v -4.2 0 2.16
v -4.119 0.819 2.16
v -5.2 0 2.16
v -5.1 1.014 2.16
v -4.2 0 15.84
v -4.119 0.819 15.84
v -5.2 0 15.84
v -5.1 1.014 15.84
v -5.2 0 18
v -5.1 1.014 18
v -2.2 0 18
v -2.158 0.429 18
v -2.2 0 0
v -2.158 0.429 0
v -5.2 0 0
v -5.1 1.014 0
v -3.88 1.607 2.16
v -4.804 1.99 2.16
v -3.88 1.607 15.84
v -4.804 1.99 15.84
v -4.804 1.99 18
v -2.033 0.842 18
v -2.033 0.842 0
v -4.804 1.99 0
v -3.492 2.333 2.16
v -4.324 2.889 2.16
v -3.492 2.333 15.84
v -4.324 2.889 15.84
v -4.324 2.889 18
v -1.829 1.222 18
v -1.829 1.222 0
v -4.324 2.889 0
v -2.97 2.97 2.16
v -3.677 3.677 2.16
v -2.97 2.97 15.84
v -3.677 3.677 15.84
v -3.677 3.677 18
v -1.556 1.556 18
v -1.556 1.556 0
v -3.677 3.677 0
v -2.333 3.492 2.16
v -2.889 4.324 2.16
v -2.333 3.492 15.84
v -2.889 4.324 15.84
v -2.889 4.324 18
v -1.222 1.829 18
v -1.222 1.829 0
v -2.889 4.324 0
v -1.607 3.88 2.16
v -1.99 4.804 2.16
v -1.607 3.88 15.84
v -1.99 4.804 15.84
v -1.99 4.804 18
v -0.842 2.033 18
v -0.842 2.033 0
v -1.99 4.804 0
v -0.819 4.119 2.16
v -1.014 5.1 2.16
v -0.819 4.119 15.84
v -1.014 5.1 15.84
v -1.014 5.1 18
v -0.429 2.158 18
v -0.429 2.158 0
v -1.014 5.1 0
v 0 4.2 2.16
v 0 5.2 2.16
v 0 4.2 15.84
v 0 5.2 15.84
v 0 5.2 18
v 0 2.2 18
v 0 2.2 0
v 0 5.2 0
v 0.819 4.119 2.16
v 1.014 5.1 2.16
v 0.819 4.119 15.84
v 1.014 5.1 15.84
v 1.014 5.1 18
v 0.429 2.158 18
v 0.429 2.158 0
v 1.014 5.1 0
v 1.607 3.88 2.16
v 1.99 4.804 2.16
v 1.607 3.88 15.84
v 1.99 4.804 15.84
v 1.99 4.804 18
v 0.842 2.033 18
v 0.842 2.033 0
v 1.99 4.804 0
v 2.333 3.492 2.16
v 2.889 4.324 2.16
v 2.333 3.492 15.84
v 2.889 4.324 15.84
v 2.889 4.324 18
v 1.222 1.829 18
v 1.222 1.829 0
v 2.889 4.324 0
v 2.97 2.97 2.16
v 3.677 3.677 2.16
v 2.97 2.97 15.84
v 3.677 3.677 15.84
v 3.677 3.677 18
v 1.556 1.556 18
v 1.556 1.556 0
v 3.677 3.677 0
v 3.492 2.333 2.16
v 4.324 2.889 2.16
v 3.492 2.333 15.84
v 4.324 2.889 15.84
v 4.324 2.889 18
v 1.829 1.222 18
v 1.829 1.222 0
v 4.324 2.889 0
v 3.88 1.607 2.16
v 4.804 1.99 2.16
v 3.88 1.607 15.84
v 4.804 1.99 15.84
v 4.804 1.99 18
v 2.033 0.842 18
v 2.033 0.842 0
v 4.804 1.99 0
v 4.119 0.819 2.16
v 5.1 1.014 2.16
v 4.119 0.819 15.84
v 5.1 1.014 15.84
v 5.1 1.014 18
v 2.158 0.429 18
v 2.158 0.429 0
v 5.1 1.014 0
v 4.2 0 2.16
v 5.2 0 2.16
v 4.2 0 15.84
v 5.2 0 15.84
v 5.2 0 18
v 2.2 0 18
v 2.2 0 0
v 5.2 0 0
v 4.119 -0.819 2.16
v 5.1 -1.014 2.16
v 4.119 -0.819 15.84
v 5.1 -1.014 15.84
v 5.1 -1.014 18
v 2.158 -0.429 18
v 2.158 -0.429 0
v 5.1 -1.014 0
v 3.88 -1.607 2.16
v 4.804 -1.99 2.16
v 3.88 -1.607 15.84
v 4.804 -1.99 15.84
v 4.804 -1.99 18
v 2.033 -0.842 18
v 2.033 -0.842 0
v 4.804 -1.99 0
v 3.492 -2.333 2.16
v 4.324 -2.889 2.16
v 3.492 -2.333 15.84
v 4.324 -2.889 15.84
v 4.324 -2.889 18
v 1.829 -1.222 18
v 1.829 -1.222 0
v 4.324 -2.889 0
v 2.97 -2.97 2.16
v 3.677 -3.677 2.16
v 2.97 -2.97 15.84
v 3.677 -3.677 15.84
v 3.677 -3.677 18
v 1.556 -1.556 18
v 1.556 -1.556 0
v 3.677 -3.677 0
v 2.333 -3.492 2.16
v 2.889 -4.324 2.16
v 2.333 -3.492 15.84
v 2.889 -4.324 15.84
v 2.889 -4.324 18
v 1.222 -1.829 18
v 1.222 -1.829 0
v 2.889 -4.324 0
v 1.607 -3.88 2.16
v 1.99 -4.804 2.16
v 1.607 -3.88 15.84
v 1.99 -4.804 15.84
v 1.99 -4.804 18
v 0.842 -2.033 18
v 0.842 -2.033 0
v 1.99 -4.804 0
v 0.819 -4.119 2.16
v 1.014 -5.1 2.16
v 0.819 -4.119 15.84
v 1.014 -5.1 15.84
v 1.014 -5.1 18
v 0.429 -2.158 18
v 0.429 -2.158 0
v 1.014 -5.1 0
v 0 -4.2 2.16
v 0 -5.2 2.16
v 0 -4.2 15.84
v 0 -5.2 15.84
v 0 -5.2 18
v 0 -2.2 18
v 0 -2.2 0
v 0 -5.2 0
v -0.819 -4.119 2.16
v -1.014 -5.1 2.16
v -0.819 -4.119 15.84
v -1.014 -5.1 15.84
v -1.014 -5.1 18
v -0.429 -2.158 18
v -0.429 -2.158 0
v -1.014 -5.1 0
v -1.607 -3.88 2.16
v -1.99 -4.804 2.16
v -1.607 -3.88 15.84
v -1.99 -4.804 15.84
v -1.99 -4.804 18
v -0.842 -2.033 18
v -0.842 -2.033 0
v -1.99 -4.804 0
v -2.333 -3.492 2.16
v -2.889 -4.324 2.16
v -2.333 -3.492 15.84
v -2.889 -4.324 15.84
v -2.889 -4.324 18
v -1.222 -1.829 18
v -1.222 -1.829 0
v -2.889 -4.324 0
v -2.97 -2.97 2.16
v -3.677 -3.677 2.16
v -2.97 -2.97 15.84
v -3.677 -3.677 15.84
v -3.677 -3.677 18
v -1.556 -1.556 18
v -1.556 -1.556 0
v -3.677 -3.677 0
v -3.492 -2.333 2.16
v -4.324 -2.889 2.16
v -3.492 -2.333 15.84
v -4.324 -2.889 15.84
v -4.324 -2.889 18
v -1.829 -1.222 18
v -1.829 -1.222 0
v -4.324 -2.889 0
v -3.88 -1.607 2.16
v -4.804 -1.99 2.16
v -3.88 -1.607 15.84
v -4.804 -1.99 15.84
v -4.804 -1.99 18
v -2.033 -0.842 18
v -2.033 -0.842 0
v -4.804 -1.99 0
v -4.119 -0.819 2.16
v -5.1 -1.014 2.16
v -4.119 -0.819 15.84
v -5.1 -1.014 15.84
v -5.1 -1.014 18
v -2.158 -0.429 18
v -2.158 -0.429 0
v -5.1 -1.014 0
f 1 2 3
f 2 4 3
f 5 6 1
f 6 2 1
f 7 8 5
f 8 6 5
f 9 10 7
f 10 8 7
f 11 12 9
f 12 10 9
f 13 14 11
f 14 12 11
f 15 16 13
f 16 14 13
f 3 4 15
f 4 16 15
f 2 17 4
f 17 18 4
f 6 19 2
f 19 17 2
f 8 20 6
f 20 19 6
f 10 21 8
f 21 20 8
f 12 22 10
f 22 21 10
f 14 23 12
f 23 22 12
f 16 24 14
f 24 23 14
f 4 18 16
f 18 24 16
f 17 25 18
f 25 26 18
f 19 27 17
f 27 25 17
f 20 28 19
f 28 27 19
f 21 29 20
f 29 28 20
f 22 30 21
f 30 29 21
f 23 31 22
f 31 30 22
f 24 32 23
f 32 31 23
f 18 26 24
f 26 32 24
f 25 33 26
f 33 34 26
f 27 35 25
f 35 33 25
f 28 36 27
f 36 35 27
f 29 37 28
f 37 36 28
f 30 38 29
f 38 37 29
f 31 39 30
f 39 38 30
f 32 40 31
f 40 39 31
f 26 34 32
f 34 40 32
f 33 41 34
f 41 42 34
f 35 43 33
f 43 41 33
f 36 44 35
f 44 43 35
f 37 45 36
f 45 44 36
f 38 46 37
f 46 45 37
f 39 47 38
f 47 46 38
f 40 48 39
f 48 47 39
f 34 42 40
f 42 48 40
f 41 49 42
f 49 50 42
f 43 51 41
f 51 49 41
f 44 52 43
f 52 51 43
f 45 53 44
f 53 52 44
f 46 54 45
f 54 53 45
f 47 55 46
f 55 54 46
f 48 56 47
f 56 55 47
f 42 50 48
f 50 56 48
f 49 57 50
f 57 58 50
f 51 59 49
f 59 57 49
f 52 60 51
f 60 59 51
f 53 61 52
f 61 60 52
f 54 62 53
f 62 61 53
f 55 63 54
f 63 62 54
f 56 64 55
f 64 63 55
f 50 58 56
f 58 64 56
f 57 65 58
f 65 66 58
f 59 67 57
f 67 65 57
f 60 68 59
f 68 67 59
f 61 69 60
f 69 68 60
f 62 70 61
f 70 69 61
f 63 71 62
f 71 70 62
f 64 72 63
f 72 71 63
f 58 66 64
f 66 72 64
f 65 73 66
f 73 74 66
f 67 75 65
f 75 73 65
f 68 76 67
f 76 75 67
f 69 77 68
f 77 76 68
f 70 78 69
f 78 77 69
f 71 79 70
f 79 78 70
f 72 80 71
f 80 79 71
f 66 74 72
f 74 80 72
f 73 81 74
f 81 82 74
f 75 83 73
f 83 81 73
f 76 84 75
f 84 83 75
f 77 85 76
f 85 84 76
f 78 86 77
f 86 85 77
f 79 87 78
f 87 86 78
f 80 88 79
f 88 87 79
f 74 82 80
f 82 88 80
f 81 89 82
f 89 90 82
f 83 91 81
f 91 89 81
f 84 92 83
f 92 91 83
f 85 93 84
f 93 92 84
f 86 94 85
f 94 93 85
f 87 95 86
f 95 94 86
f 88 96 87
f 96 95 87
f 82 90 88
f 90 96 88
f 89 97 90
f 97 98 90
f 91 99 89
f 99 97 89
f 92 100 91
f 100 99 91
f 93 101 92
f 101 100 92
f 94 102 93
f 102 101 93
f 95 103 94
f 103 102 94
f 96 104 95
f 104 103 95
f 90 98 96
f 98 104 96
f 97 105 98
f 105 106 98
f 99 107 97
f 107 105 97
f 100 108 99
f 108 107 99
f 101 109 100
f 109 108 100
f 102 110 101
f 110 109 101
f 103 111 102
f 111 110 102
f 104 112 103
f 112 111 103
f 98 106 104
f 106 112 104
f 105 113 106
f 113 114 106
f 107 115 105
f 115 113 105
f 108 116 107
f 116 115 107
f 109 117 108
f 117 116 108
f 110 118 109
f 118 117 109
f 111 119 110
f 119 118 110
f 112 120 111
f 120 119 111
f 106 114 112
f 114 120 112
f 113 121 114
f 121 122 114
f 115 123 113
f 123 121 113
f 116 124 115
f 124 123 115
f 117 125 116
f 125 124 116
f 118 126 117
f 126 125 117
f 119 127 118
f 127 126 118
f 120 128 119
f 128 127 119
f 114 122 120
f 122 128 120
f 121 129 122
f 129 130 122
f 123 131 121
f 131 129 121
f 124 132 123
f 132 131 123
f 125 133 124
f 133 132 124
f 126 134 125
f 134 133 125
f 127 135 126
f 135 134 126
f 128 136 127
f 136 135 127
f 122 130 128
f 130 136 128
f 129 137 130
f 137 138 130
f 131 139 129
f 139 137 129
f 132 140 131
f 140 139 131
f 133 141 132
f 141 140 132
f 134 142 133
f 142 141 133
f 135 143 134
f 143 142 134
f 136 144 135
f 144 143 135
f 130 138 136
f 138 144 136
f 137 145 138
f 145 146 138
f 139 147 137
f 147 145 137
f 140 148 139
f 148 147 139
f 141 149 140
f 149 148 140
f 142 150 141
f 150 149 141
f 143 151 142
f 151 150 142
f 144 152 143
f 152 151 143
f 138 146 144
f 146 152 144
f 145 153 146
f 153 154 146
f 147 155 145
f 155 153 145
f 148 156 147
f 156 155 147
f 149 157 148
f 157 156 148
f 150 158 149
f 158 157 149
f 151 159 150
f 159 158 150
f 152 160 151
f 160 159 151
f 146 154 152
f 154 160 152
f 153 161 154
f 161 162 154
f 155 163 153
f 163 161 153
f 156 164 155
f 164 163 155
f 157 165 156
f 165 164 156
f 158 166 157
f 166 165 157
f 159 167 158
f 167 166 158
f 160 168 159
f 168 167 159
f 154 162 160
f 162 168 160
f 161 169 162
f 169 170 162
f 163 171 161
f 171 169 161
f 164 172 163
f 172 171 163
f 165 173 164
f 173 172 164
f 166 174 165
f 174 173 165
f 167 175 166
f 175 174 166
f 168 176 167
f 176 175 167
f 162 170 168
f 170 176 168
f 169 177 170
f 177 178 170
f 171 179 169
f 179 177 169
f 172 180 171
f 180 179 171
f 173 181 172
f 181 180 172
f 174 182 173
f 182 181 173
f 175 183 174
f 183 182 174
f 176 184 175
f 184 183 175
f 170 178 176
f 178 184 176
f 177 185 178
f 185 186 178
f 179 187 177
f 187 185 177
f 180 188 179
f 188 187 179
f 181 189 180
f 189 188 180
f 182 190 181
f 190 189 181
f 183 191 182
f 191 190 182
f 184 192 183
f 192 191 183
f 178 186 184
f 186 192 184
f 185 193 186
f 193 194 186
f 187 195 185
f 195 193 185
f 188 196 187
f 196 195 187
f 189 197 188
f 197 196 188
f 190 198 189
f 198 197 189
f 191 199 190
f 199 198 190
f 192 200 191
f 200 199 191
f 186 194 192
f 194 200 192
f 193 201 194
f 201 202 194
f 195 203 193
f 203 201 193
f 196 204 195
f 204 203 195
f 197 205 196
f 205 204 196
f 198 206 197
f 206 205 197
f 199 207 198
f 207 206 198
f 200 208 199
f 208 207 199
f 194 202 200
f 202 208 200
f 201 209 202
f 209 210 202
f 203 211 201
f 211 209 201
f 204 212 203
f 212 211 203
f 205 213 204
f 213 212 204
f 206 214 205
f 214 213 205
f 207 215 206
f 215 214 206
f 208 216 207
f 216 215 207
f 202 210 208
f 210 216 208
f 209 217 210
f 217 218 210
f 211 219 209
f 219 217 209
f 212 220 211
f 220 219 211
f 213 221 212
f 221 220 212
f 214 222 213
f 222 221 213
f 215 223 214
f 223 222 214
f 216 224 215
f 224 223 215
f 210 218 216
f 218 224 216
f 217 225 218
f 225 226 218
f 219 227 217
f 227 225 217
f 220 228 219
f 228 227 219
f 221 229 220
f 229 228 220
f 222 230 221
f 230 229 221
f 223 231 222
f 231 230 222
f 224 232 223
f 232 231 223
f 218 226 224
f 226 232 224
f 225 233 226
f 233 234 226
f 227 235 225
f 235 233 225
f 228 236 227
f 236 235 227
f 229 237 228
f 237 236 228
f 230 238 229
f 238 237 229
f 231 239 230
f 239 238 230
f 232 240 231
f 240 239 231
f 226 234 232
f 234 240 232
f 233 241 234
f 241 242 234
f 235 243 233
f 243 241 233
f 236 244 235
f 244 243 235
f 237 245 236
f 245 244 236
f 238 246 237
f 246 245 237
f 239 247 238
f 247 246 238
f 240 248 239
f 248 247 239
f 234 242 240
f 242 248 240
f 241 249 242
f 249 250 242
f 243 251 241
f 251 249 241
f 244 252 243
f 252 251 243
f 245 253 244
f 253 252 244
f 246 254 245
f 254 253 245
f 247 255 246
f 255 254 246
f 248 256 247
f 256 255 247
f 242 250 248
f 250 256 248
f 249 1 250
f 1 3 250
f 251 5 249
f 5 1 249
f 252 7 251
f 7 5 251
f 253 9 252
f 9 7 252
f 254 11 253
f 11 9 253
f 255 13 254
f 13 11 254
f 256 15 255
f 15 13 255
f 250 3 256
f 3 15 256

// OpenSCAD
$fn = 32;

// ----------------------------------------------------------------------
// Profiled standoff: spool spacer, 18 mm long, bore 4.4 mm
// ----------------------------------------------------------------------

// --- parameters (mm) ---
revolve_angle = 360;      // full turn around the Z axis
profile_points = 8;       // points of the closed outline

profile = [[2.2, 0], [5.2, 0], [5.2, 2.16], [4.2, 2.16], [4.2, 15.84], [5.2, 15.84], [5.2, 18], [2.2, 18]];  // single closed polygon, 8 points, counter clockwise

// --- the one profile operation ---
rotate_extrude(angle = revolve_angle) polygon(points = profile);
